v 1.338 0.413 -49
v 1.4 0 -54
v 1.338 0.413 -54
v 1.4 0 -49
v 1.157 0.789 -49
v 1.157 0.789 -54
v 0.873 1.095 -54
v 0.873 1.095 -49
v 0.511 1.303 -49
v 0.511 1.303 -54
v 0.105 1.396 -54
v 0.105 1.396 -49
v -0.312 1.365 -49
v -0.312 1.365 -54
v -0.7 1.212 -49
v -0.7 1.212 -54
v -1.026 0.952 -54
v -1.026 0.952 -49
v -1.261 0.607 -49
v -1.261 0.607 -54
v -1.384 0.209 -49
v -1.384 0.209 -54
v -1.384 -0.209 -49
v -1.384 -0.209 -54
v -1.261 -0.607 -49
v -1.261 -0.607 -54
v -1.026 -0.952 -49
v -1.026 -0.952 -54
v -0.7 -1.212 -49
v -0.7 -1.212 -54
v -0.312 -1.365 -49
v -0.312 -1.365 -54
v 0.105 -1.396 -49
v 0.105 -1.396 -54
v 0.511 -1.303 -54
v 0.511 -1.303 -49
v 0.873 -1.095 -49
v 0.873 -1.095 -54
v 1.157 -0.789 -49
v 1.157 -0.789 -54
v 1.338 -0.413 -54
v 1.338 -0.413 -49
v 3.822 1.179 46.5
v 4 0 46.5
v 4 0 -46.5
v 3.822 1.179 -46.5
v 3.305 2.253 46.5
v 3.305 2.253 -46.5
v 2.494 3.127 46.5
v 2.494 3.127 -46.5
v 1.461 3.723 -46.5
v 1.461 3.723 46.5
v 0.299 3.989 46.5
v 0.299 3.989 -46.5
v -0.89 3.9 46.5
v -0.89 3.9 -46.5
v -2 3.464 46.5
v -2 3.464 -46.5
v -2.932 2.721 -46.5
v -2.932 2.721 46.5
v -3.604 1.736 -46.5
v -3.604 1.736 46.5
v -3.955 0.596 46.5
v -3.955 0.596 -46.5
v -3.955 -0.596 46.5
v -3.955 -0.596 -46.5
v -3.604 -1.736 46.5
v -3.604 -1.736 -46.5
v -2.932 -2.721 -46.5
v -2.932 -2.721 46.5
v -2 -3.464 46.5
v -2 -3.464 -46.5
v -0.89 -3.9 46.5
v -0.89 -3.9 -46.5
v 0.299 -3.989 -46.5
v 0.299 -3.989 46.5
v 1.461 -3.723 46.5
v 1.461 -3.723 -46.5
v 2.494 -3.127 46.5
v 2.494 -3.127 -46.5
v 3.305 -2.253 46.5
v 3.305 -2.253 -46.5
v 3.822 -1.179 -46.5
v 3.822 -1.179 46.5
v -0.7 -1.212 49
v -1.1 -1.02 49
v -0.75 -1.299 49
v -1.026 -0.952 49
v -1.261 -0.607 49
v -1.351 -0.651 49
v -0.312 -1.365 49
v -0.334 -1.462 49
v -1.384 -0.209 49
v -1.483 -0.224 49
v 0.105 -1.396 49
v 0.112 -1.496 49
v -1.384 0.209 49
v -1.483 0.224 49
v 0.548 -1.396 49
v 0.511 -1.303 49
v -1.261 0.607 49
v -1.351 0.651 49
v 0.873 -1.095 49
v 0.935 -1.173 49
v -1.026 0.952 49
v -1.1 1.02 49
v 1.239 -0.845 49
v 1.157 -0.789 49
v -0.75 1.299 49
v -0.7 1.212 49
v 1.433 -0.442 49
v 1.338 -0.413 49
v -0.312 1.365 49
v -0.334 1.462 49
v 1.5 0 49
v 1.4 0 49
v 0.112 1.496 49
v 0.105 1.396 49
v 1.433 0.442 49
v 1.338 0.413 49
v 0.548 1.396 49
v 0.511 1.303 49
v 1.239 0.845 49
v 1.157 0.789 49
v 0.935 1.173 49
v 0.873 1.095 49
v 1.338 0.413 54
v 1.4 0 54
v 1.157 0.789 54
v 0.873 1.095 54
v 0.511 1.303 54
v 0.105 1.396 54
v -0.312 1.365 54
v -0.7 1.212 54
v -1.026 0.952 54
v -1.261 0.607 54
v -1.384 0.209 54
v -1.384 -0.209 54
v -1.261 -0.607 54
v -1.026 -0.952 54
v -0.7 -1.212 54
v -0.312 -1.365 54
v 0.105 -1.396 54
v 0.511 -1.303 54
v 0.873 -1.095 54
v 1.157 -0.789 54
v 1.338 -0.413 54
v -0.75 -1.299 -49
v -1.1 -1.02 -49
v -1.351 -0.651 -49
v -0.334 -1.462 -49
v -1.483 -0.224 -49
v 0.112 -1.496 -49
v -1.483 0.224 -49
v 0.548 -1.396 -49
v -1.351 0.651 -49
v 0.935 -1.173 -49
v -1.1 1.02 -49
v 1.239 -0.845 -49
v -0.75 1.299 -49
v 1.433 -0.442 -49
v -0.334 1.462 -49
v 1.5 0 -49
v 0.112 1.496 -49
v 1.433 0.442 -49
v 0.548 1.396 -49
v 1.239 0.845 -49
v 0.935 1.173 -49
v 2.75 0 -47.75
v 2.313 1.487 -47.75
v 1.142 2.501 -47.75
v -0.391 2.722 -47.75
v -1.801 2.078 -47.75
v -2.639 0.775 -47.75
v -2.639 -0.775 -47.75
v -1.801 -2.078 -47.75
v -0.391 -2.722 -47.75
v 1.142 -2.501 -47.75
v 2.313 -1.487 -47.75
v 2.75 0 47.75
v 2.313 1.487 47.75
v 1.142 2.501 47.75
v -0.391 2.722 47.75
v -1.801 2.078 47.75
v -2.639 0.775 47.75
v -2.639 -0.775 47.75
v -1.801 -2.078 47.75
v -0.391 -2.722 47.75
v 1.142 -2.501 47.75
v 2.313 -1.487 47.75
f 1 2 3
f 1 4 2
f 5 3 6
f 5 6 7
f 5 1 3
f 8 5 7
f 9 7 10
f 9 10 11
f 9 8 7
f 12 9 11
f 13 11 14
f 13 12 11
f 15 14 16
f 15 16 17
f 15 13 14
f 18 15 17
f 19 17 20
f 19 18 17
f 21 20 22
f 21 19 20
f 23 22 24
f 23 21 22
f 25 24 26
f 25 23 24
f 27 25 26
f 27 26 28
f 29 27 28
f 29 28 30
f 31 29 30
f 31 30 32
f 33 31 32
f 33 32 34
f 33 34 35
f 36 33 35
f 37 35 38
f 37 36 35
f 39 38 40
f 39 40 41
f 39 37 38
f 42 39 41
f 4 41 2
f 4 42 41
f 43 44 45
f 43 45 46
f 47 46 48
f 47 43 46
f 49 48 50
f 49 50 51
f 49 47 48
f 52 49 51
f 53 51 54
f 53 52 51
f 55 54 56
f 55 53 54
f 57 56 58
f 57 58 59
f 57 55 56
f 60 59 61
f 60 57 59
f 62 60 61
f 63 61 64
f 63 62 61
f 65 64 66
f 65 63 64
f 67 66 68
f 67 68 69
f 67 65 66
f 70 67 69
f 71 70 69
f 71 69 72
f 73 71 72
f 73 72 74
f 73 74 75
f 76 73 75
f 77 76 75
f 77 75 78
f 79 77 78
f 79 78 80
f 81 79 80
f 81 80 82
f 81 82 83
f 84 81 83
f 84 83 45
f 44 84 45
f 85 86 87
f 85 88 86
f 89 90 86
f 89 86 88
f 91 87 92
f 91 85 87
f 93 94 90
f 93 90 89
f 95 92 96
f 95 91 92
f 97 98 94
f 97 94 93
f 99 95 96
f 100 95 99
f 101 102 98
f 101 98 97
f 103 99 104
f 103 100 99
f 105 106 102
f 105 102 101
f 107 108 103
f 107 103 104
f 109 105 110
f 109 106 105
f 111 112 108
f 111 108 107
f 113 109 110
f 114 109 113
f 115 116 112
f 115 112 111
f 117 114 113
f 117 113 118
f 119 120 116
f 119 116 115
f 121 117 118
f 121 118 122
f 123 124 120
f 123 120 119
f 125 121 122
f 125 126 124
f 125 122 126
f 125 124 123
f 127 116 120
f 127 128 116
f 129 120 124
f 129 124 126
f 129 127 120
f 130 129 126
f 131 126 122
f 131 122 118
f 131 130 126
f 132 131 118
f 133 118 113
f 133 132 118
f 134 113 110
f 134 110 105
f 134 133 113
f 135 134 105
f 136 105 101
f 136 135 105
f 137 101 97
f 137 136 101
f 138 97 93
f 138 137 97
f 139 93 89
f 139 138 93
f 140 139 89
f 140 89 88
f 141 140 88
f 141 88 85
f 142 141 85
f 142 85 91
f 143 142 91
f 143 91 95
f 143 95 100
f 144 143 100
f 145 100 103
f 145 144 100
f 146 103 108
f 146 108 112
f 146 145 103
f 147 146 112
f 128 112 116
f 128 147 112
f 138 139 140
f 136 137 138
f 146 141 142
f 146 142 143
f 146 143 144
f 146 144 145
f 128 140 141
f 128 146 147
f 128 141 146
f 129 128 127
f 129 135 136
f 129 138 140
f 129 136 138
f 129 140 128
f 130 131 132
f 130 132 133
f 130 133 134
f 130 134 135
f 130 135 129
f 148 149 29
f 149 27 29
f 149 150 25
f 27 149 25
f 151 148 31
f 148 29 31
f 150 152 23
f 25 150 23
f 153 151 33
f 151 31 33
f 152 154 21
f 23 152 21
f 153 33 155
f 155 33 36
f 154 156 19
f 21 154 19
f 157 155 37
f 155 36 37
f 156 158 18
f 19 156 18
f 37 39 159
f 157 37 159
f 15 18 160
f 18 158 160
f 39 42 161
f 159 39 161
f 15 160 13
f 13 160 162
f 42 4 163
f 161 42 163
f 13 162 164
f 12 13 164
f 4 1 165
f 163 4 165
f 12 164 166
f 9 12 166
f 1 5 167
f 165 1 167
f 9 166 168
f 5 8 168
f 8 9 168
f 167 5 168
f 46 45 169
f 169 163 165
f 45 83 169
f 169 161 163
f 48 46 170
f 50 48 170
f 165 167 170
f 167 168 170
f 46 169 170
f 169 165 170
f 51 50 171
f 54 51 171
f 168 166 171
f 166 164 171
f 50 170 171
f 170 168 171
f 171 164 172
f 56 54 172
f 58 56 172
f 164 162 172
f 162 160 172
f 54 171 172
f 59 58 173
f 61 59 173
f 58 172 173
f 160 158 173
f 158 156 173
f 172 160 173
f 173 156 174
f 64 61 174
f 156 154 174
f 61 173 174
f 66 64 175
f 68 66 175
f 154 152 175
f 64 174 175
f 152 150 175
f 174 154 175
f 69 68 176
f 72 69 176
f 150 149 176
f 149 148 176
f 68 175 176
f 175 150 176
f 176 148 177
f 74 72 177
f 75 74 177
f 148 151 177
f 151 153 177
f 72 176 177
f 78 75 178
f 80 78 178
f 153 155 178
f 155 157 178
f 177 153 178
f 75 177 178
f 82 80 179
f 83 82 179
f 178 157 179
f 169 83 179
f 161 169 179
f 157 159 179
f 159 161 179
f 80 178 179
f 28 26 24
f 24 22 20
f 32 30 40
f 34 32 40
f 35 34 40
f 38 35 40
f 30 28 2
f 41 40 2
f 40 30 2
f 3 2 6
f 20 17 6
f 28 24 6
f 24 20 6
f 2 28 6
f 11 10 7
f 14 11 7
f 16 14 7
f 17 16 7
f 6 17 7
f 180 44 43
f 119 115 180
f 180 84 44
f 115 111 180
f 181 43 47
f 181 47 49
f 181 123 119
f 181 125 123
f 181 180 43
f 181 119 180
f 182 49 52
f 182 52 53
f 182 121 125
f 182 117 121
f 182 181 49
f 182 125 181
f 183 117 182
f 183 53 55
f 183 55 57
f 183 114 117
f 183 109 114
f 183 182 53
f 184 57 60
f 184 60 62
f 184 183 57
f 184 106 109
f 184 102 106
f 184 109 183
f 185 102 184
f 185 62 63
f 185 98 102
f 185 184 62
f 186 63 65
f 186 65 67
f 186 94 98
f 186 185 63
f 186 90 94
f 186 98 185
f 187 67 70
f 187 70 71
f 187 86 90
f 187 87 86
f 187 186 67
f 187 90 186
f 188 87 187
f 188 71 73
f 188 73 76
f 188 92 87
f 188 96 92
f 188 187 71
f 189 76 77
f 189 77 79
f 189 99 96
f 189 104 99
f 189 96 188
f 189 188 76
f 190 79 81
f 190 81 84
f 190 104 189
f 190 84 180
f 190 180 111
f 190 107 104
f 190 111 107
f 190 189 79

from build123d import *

# Parameters (mm, degrees)
DODANIE_WYCI_GNI_CIE1_DEPTH      = 54
DODANIE_WYCI_GNI_CIE1_DEPTH_BACK = 54
SZKIC1_R                         = 1.4
DODANIE_WYCI_GNI_CIE2_DEPTH      = 49
DODANIE_WYCI_GNI_CIE2_DEPTH_BACK = 49
SZKIC2_R                         = 4
SFAZOWANIE4_SIZE                 = 2.5


with BuildPart() as part:
    # Szkic1 → Dodanie-wyciągnięcie1 (new, two sides: drawn at the far end of the back side and taken through both)
    with BuildSketch(Plane.XY.offset(-DODANIE_WYCI_GNI_CIE1_DEPTH_BACK)):
        Circle(SZKIC1_R)
    extrude(amount=DODANIE_WYCI_GNI_CIE1_DEPTH + DODANIE_WYCI_GNI_CIE1_DEPTH_BACK)

    # Szkic2 → Dodanie-wyciągnięcie2 (add, two sides: drawn at the far end of the back side and taken through both)
    with BuildSketch(Plane.XY.offset(-DODANIE_WYCI_GNI_CIE2_DEPTH_BACK)):
        Circle(SZKIC2_R)
    extrude(amount=DODANIE_WYCI_GNI_CIE2_DEPTH + DODANIE_WYCI_GNI_CIE2_DEPTH_BACK)

    # Sfazowanie4
    sfazowanie4_edges = [part.edges().sort_by_distance(p)[0] for p in [
        (-4, 0, -49),
        (-4, 0, 49),
    ]]
    chamfer(sfazowanie4_edges, length=SFAZOWANIE4_SIZE)


solid = part.part
